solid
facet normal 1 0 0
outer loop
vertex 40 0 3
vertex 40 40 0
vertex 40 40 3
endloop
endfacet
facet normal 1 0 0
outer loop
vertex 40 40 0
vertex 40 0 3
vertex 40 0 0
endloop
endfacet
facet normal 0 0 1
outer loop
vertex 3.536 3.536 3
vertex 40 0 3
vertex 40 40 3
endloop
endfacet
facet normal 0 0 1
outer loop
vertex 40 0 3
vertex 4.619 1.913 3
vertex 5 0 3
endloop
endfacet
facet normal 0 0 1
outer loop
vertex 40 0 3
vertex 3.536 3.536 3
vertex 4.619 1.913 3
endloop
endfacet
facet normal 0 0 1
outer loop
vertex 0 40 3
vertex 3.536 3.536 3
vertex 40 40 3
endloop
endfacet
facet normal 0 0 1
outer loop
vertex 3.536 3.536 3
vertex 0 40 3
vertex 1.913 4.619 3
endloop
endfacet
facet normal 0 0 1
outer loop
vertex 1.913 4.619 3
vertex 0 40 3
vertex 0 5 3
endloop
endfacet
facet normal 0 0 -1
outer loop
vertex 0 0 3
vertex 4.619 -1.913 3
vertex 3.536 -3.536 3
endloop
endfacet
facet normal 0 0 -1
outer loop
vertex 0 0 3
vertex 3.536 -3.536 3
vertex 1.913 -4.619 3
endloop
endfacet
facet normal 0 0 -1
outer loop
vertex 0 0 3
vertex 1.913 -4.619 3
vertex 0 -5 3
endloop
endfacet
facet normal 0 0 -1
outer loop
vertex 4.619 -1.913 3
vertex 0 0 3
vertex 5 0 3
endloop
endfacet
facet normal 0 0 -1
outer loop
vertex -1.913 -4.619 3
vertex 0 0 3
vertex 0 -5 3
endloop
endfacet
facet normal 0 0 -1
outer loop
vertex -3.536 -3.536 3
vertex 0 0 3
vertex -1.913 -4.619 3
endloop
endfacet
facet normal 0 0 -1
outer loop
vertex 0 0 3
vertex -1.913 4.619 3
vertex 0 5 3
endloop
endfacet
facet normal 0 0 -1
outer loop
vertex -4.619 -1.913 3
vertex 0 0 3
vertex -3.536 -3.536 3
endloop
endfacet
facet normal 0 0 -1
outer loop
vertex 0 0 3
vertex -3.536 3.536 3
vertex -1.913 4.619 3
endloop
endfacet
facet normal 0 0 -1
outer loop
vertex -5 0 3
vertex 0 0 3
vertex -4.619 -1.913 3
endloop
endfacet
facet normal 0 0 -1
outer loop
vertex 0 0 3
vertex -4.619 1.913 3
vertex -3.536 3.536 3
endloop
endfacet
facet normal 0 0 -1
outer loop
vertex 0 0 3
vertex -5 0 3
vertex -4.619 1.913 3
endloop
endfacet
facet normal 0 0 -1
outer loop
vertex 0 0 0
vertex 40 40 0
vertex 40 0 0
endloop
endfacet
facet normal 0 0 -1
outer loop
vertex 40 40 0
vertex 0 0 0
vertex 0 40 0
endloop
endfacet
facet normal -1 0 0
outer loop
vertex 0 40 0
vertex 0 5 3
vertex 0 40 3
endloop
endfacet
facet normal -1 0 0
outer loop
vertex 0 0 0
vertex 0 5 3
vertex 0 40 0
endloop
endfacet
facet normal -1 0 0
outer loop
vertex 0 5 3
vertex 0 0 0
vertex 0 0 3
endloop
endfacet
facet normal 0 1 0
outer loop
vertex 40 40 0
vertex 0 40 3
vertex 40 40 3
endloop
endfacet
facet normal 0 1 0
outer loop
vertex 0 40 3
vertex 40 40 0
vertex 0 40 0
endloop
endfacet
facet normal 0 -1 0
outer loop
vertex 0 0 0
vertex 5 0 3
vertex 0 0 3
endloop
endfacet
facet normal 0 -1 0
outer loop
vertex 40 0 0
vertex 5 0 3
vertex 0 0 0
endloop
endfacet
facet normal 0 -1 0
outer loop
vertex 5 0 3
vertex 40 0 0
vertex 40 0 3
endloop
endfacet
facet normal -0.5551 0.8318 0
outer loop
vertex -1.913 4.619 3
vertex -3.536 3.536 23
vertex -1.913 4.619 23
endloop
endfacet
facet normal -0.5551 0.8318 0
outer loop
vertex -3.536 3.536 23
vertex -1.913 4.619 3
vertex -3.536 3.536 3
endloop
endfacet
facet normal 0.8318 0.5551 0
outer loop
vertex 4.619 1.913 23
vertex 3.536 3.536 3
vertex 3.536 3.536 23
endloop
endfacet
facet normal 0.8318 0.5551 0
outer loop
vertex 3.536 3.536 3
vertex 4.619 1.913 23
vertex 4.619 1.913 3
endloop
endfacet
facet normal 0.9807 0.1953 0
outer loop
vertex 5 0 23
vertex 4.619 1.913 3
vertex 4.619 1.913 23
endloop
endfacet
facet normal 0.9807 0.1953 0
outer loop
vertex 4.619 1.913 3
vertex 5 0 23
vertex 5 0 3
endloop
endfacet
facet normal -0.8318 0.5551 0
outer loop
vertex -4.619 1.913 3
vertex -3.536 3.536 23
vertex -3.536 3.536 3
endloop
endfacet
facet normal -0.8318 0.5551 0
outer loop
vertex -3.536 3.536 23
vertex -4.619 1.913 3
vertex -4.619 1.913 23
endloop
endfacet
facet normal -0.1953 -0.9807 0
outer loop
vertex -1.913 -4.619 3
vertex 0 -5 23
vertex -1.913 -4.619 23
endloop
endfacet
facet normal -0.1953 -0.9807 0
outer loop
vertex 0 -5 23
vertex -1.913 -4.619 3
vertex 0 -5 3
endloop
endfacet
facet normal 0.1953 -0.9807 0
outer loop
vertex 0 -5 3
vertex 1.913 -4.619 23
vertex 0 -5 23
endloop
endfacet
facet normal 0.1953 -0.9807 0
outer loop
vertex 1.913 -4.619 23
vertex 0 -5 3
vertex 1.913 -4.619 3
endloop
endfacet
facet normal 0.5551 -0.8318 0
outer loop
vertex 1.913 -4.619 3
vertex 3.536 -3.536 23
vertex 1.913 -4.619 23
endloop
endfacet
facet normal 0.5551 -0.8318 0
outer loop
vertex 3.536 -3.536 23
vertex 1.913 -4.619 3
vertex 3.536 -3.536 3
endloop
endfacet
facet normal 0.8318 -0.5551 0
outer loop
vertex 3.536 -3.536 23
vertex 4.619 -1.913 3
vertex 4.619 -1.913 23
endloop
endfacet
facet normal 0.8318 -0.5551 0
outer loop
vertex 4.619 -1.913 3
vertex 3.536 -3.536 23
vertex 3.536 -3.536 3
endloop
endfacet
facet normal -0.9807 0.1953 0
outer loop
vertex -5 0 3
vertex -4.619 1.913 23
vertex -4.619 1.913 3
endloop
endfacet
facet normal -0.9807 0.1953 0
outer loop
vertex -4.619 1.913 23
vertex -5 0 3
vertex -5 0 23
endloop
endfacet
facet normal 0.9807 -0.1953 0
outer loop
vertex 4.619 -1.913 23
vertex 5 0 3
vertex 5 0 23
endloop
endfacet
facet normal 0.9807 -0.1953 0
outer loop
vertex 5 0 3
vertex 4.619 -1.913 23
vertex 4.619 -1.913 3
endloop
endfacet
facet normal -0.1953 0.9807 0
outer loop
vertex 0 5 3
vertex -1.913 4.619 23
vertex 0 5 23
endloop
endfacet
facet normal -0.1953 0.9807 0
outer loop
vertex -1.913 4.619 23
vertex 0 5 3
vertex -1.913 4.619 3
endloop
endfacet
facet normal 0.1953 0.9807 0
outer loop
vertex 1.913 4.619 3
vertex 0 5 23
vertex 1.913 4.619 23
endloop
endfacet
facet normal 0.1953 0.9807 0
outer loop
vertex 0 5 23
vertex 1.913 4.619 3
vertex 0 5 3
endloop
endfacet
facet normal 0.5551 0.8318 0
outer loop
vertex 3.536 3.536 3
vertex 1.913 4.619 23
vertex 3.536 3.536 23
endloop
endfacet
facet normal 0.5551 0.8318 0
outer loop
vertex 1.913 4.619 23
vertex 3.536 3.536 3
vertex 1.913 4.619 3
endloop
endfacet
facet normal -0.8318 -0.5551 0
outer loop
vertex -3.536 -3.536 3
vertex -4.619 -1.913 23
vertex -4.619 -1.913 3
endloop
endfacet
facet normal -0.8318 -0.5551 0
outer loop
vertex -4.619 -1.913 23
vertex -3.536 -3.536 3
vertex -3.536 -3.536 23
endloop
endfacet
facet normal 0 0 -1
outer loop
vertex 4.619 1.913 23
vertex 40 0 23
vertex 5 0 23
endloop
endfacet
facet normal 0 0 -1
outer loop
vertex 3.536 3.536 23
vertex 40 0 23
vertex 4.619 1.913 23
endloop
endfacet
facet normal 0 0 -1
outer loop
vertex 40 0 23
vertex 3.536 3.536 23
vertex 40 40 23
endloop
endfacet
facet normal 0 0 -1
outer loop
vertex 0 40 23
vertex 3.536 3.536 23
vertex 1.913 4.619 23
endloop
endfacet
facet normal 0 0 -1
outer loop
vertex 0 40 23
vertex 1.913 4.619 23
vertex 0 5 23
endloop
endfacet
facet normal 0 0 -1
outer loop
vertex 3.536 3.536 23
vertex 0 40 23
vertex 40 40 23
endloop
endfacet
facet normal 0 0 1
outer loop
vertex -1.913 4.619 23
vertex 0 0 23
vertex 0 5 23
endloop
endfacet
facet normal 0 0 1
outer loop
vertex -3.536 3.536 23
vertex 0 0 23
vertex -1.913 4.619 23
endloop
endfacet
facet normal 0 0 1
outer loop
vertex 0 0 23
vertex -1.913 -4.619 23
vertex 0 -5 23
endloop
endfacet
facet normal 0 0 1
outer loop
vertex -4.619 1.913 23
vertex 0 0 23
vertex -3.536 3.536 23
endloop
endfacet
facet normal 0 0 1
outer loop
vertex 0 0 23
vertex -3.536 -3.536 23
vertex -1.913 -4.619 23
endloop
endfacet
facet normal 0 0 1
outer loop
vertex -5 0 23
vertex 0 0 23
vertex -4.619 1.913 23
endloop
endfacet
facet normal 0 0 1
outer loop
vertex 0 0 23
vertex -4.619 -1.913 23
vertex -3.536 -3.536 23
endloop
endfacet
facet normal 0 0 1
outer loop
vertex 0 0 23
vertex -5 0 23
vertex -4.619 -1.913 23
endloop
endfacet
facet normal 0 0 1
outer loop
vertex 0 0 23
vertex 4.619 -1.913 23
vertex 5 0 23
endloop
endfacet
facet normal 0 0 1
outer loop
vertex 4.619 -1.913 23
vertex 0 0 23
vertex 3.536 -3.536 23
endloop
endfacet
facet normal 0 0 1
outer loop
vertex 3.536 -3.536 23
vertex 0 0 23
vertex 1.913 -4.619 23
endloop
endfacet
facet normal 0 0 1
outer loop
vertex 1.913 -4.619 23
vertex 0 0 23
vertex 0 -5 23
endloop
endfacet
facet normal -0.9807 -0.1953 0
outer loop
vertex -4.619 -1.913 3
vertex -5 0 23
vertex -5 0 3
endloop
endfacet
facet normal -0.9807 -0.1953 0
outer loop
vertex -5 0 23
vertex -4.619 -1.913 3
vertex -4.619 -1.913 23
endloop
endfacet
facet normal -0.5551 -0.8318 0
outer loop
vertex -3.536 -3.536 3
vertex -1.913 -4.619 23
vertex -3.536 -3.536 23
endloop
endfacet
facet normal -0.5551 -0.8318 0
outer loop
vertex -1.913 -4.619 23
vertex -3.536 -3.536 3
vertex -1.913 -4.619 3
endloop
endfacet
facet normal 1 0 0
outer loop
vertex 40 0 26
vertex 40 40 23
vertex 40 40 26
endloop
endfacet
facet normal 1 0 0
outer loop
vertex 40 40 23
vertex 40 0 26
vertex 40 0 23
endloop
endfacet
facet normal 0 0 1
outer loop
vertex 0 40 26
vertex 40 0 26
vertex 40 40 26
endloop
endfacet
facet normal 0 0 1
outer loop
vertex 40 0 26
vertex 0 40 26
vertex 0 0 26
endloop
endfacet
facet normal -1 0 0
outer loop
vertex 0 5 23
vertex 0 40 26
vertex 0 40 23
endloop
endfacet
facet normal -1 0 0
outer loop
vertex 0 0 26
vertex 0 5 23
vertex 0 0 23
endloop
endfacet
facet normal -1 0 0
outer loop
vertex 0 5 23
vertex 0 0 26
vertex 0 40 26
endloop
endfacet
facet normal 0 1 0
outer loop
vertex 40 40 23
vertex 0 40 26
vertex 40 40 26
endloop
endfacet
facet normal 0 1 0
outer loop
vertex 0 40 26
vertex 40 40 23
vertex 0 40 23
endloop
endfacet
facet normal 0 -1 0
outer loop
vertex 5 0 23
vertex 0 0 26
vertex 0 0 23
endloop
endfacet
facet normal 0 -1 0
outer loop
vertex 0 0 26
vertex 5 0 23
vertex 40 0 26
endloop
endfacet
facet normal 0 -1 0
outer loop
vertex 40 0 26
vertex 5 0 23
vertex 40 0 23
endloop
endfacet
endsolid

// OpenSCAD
// expect: assembly of 3 colored parts
color("gray") cube([40, 40, 3]);
color("red") translate([0, 0, 3]) cylinder(d = 10, h = 20);
color("blue") translate([0, 0, 23]) cube([40, 40, 3]);
